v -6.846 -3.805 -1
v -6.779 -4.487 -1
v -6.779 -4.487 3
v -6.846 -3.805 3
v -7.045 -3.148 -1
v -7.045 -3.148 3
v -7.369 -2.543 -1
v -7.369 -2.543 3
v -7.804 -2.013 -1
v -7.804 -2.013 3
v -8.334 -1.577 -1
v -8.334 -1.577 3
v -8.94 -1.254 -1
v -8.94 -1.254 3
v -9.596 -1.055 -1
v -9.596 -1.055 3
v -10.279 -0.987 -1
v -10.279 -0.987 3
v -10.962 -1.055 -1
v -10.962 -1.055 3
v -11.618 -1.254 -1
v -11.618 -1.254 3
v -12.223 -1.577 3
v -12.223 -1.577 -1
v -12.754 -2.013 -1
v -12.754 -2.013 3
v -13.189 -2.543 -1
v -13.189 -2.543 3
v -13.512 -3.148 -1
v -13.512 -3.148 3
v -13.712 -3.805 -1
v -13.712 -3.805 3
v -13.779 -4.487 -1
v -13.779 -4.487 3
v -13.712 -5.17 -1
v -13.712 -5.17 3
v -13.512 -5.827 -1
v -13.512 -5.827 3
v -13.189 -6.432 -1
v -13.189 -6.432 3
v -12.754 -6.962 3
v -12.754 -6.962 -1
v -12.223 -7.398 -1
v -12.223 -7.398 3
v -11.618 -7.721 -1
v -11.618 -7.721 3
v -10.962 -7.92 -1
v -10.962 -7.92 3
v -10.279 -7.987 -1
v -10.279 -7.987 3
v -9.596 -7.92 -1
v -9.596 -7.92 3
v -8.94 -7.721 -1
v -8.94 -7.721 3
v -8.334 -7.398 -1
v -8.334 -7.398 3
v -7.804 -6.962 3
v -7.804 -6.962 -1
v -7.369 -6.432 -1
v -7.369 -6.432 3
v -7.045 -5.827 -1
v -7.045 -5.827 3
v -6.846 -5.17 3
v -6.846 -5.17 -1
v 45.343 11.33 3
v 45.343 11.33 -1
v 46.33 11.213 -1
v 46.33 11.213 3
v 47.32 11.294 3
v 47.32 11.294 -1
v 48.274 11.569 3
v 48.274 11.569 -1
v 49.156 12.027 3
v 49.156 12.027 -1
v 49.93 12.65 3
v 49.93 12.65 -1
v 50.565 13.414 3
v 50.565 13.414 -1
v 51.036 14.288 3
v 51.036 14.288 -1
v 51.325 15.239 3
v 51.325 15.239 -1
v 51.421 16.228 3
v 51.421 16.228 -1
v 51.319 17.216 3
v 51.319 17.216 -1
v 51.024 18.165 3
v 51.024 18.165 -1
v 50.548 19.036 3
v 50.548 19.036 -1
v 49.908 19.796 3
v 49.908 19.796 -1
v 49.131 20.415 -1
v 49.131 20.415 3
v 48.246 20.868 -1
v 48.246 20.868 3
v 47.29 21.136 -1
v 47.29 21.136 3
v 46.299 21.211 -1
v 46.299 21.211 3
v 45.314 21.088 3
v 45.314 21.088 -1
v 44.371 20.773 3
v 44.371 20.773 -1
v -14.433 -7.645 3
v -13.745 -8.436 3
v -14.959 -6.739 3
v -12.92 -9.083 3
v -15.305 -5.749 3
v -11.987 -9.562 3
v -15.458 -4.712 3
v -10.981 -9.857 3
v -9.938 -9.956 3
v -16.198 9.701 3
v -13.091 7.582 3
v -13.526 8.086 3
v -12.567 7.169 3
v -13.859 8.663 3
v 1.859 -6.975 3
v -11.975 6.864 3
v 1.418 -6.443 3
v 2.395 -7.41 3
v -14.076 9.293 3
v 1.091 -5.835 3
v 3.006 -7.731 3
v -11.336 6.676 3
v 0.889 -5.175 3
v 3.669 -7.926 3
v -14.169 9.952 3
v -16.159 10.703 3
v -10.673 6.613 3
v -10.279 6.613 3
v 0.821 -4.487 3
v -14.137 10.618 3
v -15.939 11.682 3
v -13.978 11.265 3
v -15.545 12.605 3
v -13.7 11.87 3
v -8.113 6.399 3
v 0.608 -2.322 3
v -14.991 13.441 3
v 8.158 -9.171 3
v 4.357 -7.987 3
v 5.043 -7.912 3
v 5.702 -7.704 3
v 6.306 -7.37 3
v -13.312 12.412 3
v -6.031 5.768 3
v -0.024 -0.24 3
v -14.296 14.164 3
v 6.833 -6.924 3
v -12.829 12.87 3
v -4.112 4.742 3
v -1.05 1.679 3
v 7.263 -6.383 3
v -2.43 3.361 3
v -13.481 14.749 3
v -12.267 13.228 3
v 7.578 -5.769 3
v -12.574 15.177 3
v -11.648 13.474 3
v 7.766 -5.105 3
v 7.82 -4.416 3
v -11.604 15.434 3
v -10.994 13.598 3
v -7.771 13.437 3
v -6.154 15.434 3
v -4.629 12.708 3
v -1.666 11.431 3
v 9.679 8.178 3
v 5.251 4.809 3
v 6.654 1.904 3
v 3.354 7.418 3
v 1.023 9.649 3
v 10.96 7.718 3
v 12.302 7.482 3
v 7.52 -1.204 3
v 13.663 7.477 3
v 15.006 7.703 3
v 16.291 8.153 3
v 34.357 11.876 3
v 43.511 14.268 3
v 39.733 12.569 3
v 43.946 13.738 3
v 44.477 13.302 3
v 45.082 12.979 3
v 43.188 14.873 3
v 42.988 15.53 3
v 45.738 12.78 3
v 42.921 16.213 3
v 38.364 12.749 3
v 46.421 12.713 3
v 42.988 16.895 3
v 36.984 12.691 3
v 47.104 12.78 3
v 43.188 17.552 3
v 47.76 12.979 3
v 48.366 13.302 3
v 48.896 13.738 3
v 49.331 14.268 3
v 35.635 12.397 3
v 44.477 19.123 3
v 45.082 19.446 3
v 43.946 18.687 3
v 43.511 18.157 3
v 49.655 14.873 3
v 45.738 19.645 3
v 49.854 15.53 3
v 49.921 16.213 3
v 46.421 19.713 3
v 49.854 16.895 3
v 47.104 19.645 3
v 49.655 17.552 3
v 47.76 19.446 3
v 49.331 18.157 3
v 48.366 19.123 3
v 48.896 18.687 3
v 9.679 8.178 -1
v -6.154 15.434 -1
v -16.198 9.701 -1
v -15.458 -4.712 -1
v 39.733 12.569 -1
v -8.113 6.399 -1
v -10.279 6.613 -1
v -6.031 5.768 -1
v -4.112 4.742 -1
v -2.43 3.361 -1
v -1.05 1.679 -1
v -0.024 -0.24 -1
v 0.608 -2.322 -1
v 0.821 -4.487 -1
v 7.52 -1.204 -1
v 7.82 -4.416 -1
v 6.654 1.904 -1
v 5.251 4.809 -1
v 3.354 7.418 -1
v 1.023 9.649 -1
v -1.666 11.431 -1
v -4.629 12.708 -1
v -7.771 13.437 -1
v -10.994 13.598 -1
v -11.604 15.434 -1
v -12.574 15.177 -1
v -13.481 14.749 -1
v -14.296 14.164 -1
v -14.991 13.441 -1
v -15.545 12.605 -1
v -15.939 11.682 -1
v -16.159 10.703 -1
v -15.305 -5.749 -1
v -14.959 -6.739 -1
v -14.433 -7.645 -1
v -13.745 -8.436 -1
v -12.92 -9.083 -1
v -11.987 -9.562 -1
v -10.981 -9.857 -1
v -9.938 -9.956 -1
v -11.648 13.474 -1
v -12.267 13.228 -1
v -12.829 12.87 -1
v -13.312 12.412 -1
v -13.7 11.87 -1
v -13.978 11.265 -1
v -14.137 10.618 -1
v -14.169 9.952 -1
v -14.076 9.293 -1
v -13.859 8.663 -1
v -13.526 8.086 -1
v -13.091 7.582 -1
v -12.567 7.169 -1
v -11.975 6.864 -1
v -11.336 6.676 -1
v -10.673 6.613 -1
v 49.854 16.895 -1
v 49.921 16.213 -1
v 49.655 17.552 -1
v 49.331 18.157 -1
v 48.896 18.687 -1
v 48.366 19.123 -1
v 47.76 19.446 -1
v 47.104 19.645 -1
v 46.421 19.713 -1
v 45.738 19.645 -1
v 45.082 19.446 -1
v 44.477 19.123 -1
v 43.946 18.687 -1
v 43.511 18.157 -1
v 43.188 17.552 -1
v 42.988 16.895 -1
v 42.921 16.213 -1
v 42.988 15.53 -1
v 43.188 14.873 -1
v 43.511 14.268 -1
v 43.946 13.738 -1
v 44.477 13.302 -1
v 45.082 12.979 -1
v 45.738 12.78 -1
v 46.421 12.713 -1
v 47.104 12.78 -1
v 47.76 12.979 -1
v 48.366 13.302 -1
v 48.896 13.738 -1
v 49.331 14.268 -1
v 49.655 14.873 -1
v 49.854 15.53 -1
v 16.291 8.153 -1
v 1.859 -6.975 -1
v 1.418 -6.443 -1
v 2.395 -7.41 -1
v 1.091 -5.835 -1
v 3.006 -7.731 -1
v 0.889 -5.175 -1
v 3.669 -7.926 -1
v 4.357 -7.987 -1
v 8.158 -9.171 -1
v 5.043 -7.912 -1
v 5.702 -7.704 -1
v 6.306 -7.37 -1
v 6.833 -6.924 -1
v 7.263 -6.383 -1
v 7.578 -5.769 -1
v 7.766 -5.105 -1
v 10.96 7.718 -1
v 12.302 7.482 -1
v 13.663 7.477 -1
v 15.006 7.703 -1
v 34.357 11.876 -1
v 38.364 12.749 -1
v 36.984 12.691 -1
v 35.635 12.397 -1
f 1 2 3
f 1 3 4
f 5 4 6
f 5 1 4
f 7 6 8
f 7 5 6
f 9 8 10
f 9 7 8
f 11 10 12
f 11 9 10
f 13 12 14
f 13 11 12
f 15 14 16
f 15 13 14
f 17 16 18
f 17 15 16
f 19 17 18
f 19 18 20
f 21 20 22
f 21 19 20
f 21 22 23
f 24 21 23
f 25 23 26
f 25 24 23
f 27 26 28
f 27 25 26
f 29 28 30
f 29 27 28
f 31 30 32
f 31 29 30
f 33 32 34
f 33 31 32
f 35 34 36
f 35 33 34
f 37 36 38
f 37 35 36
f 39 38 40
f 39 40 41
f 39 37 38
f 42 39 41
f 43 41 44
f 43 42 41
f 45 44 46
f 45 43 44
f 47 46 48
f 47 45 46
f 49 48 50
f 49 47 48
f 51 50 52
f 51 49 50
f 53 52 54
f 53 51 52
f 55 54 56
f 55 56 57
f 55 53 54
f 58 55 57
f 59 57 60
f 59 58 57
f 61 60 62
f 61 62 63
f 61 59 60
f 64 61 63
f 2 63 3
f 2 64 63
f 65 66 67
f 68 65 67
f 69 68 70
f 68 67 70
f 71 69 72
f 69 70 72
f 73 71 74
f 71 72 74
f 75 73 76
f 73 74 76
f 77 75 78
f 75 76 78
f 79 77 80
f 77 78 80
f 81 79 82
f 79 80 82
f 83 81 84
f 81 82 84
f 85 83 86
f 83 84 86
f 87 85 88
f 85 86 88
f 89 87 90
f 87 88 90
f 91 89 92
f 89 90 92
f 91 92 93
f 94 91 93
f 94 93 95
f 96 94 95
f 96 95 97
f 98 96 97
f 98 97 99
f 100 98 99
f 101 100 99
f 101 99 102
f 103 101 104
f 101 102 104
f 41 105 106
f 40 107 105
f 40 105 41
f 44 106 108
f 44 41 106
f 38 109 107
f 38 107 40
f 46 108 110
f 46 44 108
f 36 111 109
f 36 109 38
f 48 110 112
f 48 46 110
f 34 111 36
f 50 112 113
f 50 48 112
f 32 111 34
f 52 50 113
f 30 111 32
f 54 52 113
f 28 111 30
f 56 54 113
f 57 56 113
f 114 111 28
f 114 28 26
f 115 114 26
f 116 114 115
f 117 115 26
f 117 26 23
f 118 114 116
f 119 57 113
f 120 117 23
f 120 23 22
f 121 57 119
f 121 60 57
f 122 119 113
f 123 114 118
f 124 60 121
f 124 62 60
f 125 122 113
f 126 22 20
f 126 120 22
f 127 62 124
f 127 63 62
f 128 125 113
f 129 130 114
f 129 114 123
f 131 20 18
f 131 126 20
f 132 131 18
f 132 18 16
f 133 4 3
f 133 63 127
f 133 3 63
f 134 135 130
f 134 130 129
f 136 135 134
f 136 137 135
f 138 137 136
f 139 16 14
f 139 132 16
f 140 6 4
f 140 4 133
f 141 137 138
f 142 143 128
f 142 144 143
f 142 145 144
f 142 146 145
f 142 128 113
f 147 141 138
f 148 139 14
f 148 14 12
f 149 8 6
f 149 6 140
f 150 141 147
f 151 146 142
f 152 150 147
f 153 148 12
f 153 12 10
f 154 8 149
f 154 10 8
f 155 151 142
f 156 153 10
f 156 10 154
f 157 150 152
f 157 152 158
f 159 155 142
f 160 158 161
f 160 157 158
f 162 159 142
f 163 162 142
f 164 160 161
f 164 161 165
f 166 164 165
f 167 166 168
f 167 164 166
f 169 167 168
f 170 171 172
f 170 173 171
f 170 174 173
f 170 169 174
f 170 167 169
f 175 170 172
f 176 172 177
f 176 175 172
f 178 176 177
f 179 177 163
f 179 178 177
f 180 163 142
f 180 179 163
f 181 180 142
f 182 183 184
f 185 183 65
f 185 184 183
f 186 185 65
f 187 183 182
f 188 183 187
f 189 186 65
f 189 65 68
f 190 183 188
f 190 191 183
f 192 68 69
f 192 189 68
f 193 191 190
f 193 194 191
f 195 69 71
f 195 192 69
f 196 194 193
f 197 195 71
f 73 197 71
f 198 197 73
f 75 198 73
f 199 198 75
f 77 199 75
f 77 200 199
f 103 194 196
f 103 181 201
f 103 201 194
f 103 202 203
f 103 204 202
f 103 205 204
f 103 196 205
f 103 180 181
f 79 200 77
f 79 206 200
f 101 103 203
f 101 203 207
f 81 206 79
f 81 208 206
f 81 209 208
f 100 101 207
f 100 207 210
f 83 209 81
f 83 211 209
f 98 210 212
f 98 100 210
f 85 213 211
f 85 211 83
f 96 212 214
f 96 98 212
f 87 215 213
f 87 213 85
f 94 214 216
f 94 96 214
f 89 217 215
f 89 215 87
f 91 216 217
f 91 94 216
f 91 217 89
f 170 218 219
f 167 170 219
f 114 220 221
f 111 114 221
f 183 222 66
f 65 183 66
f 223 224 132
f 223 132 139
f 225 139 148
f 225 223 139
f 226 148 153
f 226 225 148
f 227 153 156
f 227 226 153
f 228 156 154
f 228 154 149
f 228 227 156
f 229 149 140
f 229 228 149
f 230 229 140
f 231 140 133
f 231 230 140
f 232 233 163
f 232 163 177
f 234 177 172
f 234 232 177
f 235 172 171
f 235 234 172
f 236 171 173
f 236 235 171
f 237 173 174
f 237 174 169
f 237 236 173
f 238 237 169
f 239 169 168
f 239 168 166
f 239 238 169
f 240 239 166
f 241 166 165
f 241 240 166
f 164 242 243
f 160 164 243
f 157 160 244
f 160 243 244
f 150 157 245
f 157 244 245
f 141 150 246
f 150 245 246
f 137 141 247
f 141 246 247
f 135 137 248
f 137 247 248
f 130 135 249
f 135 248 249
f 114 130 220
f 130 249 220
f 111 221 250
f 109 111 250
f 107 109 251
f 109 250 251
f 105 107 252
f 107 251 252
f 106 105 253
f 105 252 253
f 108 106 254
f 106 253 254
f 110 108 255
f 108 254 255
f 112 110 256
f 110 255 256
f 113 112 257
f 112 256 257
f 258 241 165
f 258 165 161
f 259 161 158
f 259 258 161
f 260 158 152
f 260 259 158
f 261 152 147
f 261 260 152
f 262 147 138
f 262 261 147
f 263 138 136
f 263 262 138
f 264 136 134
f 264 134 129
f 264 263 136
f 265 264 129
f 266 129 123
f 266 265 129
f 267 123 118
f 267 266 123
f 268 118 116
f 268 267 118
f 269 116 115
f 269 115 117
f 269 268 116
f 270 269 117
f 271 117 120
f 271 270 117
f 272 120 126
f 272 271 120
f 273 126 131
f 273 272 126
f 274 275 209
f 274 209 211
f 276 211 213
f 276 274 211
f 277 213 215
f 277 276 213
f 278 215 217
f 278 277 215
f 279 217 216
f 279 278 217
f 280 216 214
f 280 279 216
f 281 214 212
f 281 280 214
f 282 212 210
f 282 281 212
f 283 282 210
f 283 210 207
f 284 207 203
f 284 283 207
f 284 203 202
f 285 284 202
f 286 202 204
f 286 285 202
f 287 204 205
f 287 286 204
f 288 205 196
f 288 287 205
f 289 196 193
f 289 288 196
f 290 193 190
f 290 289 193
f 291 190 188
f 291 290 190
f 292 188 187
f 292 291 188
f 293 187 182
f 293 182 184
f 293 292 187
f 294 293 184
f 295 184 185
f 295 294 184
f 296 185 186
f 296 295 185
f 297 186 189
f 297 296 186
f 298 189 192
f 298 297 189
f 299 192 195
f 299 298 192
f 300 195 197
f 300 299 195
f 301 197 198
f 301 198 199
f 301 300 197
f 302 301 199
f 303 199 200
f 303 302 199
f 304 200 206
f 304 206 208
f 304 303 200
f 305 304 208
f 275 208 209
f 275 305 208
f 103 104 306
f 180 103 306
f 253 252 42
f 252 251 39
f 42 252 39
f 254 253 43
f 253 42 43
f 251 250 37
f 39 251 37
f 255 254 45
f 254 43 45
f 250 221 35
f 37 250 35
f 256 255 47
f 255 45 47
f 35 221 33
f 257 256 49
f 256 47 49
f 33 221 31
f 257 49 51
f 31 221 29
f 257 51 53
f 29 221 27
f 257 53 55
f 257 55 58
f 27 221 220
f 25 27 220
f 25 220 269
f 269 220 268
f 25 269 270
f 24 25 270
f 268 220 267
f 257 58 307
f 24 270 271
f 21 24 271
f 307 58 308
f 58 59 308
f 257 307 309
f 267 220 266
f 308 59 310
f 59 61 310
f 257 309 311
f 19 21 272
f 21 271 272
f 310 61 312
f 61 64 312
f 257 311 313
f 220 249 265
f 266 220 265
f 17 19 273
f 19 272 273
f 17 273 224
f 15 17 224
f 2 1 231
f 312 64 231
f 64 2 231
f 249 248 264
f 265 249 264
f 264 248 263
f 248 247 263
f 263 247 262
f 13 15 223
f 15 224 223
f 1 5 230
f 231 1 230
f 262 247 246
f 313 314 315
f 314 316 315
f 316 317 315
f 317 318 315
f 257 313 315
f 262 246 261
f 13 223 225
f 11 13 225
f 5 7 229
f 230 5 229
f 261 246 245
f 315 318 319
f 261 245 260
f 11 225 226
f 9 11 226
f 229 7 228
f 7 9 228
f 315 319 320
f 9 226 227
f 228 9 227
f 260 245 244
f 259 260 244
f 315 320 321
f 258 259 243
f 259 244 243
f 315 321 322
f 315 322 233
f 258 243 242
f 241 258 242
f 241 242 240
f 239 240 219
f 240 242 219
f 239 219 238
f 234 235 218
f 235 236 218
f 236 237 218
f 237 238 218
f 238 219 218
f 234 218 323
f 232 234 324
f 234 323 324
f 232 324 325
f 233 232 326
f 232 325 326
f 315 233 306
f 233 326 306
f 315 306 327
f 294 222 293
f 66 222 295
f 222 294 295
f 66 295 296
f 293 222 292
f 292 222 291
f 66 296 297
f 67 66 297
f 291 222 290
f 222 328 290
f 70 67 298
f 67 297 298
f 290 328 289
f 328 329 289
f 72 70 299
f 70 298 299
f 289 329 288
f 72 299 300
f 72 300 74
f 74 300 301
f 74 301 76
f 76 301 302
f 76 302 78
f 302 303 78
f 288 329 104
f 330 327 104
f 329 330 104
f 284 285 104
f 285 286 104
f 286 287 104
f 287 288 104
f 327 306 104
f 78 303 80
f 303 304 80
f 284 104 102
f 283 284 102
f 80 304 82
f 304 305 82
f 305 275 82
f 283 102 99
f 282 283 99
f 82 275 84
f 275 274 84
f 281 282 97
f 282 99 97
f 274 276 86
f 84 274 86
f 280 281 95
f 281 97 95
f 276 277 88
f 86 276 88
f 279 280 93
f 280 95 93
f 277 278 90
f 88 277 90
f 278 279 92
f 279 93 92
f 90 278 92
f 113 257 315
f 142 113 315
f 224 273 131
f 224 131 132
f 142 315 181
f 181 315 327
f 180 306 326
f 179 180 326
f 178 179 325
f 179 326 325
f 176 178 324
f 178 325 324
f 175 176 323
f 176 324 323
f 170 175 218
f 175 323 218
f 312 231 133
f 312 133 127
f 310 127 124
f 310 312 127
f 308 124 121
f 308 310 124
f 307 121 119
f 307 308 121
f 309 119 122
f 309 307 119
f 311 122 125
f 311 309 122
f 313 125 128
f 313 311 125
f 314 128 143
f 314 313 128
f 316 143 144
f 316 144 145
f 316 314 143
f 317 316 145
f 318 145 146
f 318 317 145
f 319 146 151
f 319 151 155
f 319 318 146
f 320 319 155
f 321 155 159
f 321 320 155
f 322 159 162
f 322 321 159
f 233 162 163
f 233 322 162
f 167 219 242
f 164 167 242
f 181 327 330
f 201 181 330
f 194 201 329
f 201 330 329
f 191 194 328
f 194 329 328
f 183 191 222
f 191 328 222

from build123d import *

# Parameters (mm, degrees)
SKETCH2_R           = 1.75
BOSS_EXTRUDE1_DEPTH = 2
SCALE1_SCALE        = 2


with BuildPart() as part:
    # Sketch2 → Boss-Extrude1 (new body)
    with BuildSketch(Plane.XY):
        with BuildLine():
            Line((-2.959686812, 7.094235734), (-2.589510897, -0.112410482))
            ThreePointArc((-2.589510897, -0.112410482), (-1.732883601, -1.97439389), (0.17059178, -2.73437679))
            Line((0.17059178, -2.73437679), (9.218440829, -2.341769901))
            Line((9.218440829, -2.341769901), (22.318004544, 8.181471599))
            ThreePointArc((22.318004544, 8.181471599), (23.631672458, 8.589402593), (25.00585725, 8.528187863))
            Line((25.00585725, 8.528187863), (27.810968992, 7.908802431))
            ThreePointArc((27.810968992, 7.908802431), (30.836871293, 10.605873355), (27.325176398, 12.630293092))
            Line((27.325176398, 12.630293092), (13.285071523, 6.320301234))
            ThreePointArc((13.285071523, 6.320301234), (11.630616958, 5.968797328), (9.978797309, 6.332482295))
            Line((9.978797309, 6.332482295), (2.062383287, 9.960674362))
            Line((2.062383287, 9.960674362), (-0.662699736, 9.960674362))
            ThreePointArc((-0.662699736, 9.960674362), (-2.356294969, 8.964265917), (-2.959686812, 7.094235734))
        make_face()
        Circle(SKETCH2_R, mode=Mode.SUBTRACT)
        with Locations((28.35, 10.35)):
            Circle(SKETCH2_R, mode=Mode.SUBTRACT)
        with BuildLine():
            Line((-0.197115754, 5.55), (0, 5.55))
            ThreePointArc((0, 5.55), (3.924442636, 3.924442636), (5.55, 0))
            ThreePointArc((5.55, 0), (7.317827511, -1.749909192), (9.049636777, 0.035653171))
            ThreePointArc((9.049636777, 0.035653171), (6.258630387, 6.536569638), (-0.357350166, 9.042648827))
            ThreePointArc((-0.357350166, 9.042648827), (-1.945276995, 7.219798525), (-0.197115754, 5.55))
        make_face(mode=Mode.SUBTRACT)
    extrude(amount=BOSS_EXTRUDE1_DEPTH)


with BuildPart() as part_1:
    # Scale1: scaled about (10.278907769, 4.487421788, 1)
    add(part.part.scale(SCALE1_SCALE).moved(Location((-10.278907769, -4.487421788, -1))))


solid = part_1.part
